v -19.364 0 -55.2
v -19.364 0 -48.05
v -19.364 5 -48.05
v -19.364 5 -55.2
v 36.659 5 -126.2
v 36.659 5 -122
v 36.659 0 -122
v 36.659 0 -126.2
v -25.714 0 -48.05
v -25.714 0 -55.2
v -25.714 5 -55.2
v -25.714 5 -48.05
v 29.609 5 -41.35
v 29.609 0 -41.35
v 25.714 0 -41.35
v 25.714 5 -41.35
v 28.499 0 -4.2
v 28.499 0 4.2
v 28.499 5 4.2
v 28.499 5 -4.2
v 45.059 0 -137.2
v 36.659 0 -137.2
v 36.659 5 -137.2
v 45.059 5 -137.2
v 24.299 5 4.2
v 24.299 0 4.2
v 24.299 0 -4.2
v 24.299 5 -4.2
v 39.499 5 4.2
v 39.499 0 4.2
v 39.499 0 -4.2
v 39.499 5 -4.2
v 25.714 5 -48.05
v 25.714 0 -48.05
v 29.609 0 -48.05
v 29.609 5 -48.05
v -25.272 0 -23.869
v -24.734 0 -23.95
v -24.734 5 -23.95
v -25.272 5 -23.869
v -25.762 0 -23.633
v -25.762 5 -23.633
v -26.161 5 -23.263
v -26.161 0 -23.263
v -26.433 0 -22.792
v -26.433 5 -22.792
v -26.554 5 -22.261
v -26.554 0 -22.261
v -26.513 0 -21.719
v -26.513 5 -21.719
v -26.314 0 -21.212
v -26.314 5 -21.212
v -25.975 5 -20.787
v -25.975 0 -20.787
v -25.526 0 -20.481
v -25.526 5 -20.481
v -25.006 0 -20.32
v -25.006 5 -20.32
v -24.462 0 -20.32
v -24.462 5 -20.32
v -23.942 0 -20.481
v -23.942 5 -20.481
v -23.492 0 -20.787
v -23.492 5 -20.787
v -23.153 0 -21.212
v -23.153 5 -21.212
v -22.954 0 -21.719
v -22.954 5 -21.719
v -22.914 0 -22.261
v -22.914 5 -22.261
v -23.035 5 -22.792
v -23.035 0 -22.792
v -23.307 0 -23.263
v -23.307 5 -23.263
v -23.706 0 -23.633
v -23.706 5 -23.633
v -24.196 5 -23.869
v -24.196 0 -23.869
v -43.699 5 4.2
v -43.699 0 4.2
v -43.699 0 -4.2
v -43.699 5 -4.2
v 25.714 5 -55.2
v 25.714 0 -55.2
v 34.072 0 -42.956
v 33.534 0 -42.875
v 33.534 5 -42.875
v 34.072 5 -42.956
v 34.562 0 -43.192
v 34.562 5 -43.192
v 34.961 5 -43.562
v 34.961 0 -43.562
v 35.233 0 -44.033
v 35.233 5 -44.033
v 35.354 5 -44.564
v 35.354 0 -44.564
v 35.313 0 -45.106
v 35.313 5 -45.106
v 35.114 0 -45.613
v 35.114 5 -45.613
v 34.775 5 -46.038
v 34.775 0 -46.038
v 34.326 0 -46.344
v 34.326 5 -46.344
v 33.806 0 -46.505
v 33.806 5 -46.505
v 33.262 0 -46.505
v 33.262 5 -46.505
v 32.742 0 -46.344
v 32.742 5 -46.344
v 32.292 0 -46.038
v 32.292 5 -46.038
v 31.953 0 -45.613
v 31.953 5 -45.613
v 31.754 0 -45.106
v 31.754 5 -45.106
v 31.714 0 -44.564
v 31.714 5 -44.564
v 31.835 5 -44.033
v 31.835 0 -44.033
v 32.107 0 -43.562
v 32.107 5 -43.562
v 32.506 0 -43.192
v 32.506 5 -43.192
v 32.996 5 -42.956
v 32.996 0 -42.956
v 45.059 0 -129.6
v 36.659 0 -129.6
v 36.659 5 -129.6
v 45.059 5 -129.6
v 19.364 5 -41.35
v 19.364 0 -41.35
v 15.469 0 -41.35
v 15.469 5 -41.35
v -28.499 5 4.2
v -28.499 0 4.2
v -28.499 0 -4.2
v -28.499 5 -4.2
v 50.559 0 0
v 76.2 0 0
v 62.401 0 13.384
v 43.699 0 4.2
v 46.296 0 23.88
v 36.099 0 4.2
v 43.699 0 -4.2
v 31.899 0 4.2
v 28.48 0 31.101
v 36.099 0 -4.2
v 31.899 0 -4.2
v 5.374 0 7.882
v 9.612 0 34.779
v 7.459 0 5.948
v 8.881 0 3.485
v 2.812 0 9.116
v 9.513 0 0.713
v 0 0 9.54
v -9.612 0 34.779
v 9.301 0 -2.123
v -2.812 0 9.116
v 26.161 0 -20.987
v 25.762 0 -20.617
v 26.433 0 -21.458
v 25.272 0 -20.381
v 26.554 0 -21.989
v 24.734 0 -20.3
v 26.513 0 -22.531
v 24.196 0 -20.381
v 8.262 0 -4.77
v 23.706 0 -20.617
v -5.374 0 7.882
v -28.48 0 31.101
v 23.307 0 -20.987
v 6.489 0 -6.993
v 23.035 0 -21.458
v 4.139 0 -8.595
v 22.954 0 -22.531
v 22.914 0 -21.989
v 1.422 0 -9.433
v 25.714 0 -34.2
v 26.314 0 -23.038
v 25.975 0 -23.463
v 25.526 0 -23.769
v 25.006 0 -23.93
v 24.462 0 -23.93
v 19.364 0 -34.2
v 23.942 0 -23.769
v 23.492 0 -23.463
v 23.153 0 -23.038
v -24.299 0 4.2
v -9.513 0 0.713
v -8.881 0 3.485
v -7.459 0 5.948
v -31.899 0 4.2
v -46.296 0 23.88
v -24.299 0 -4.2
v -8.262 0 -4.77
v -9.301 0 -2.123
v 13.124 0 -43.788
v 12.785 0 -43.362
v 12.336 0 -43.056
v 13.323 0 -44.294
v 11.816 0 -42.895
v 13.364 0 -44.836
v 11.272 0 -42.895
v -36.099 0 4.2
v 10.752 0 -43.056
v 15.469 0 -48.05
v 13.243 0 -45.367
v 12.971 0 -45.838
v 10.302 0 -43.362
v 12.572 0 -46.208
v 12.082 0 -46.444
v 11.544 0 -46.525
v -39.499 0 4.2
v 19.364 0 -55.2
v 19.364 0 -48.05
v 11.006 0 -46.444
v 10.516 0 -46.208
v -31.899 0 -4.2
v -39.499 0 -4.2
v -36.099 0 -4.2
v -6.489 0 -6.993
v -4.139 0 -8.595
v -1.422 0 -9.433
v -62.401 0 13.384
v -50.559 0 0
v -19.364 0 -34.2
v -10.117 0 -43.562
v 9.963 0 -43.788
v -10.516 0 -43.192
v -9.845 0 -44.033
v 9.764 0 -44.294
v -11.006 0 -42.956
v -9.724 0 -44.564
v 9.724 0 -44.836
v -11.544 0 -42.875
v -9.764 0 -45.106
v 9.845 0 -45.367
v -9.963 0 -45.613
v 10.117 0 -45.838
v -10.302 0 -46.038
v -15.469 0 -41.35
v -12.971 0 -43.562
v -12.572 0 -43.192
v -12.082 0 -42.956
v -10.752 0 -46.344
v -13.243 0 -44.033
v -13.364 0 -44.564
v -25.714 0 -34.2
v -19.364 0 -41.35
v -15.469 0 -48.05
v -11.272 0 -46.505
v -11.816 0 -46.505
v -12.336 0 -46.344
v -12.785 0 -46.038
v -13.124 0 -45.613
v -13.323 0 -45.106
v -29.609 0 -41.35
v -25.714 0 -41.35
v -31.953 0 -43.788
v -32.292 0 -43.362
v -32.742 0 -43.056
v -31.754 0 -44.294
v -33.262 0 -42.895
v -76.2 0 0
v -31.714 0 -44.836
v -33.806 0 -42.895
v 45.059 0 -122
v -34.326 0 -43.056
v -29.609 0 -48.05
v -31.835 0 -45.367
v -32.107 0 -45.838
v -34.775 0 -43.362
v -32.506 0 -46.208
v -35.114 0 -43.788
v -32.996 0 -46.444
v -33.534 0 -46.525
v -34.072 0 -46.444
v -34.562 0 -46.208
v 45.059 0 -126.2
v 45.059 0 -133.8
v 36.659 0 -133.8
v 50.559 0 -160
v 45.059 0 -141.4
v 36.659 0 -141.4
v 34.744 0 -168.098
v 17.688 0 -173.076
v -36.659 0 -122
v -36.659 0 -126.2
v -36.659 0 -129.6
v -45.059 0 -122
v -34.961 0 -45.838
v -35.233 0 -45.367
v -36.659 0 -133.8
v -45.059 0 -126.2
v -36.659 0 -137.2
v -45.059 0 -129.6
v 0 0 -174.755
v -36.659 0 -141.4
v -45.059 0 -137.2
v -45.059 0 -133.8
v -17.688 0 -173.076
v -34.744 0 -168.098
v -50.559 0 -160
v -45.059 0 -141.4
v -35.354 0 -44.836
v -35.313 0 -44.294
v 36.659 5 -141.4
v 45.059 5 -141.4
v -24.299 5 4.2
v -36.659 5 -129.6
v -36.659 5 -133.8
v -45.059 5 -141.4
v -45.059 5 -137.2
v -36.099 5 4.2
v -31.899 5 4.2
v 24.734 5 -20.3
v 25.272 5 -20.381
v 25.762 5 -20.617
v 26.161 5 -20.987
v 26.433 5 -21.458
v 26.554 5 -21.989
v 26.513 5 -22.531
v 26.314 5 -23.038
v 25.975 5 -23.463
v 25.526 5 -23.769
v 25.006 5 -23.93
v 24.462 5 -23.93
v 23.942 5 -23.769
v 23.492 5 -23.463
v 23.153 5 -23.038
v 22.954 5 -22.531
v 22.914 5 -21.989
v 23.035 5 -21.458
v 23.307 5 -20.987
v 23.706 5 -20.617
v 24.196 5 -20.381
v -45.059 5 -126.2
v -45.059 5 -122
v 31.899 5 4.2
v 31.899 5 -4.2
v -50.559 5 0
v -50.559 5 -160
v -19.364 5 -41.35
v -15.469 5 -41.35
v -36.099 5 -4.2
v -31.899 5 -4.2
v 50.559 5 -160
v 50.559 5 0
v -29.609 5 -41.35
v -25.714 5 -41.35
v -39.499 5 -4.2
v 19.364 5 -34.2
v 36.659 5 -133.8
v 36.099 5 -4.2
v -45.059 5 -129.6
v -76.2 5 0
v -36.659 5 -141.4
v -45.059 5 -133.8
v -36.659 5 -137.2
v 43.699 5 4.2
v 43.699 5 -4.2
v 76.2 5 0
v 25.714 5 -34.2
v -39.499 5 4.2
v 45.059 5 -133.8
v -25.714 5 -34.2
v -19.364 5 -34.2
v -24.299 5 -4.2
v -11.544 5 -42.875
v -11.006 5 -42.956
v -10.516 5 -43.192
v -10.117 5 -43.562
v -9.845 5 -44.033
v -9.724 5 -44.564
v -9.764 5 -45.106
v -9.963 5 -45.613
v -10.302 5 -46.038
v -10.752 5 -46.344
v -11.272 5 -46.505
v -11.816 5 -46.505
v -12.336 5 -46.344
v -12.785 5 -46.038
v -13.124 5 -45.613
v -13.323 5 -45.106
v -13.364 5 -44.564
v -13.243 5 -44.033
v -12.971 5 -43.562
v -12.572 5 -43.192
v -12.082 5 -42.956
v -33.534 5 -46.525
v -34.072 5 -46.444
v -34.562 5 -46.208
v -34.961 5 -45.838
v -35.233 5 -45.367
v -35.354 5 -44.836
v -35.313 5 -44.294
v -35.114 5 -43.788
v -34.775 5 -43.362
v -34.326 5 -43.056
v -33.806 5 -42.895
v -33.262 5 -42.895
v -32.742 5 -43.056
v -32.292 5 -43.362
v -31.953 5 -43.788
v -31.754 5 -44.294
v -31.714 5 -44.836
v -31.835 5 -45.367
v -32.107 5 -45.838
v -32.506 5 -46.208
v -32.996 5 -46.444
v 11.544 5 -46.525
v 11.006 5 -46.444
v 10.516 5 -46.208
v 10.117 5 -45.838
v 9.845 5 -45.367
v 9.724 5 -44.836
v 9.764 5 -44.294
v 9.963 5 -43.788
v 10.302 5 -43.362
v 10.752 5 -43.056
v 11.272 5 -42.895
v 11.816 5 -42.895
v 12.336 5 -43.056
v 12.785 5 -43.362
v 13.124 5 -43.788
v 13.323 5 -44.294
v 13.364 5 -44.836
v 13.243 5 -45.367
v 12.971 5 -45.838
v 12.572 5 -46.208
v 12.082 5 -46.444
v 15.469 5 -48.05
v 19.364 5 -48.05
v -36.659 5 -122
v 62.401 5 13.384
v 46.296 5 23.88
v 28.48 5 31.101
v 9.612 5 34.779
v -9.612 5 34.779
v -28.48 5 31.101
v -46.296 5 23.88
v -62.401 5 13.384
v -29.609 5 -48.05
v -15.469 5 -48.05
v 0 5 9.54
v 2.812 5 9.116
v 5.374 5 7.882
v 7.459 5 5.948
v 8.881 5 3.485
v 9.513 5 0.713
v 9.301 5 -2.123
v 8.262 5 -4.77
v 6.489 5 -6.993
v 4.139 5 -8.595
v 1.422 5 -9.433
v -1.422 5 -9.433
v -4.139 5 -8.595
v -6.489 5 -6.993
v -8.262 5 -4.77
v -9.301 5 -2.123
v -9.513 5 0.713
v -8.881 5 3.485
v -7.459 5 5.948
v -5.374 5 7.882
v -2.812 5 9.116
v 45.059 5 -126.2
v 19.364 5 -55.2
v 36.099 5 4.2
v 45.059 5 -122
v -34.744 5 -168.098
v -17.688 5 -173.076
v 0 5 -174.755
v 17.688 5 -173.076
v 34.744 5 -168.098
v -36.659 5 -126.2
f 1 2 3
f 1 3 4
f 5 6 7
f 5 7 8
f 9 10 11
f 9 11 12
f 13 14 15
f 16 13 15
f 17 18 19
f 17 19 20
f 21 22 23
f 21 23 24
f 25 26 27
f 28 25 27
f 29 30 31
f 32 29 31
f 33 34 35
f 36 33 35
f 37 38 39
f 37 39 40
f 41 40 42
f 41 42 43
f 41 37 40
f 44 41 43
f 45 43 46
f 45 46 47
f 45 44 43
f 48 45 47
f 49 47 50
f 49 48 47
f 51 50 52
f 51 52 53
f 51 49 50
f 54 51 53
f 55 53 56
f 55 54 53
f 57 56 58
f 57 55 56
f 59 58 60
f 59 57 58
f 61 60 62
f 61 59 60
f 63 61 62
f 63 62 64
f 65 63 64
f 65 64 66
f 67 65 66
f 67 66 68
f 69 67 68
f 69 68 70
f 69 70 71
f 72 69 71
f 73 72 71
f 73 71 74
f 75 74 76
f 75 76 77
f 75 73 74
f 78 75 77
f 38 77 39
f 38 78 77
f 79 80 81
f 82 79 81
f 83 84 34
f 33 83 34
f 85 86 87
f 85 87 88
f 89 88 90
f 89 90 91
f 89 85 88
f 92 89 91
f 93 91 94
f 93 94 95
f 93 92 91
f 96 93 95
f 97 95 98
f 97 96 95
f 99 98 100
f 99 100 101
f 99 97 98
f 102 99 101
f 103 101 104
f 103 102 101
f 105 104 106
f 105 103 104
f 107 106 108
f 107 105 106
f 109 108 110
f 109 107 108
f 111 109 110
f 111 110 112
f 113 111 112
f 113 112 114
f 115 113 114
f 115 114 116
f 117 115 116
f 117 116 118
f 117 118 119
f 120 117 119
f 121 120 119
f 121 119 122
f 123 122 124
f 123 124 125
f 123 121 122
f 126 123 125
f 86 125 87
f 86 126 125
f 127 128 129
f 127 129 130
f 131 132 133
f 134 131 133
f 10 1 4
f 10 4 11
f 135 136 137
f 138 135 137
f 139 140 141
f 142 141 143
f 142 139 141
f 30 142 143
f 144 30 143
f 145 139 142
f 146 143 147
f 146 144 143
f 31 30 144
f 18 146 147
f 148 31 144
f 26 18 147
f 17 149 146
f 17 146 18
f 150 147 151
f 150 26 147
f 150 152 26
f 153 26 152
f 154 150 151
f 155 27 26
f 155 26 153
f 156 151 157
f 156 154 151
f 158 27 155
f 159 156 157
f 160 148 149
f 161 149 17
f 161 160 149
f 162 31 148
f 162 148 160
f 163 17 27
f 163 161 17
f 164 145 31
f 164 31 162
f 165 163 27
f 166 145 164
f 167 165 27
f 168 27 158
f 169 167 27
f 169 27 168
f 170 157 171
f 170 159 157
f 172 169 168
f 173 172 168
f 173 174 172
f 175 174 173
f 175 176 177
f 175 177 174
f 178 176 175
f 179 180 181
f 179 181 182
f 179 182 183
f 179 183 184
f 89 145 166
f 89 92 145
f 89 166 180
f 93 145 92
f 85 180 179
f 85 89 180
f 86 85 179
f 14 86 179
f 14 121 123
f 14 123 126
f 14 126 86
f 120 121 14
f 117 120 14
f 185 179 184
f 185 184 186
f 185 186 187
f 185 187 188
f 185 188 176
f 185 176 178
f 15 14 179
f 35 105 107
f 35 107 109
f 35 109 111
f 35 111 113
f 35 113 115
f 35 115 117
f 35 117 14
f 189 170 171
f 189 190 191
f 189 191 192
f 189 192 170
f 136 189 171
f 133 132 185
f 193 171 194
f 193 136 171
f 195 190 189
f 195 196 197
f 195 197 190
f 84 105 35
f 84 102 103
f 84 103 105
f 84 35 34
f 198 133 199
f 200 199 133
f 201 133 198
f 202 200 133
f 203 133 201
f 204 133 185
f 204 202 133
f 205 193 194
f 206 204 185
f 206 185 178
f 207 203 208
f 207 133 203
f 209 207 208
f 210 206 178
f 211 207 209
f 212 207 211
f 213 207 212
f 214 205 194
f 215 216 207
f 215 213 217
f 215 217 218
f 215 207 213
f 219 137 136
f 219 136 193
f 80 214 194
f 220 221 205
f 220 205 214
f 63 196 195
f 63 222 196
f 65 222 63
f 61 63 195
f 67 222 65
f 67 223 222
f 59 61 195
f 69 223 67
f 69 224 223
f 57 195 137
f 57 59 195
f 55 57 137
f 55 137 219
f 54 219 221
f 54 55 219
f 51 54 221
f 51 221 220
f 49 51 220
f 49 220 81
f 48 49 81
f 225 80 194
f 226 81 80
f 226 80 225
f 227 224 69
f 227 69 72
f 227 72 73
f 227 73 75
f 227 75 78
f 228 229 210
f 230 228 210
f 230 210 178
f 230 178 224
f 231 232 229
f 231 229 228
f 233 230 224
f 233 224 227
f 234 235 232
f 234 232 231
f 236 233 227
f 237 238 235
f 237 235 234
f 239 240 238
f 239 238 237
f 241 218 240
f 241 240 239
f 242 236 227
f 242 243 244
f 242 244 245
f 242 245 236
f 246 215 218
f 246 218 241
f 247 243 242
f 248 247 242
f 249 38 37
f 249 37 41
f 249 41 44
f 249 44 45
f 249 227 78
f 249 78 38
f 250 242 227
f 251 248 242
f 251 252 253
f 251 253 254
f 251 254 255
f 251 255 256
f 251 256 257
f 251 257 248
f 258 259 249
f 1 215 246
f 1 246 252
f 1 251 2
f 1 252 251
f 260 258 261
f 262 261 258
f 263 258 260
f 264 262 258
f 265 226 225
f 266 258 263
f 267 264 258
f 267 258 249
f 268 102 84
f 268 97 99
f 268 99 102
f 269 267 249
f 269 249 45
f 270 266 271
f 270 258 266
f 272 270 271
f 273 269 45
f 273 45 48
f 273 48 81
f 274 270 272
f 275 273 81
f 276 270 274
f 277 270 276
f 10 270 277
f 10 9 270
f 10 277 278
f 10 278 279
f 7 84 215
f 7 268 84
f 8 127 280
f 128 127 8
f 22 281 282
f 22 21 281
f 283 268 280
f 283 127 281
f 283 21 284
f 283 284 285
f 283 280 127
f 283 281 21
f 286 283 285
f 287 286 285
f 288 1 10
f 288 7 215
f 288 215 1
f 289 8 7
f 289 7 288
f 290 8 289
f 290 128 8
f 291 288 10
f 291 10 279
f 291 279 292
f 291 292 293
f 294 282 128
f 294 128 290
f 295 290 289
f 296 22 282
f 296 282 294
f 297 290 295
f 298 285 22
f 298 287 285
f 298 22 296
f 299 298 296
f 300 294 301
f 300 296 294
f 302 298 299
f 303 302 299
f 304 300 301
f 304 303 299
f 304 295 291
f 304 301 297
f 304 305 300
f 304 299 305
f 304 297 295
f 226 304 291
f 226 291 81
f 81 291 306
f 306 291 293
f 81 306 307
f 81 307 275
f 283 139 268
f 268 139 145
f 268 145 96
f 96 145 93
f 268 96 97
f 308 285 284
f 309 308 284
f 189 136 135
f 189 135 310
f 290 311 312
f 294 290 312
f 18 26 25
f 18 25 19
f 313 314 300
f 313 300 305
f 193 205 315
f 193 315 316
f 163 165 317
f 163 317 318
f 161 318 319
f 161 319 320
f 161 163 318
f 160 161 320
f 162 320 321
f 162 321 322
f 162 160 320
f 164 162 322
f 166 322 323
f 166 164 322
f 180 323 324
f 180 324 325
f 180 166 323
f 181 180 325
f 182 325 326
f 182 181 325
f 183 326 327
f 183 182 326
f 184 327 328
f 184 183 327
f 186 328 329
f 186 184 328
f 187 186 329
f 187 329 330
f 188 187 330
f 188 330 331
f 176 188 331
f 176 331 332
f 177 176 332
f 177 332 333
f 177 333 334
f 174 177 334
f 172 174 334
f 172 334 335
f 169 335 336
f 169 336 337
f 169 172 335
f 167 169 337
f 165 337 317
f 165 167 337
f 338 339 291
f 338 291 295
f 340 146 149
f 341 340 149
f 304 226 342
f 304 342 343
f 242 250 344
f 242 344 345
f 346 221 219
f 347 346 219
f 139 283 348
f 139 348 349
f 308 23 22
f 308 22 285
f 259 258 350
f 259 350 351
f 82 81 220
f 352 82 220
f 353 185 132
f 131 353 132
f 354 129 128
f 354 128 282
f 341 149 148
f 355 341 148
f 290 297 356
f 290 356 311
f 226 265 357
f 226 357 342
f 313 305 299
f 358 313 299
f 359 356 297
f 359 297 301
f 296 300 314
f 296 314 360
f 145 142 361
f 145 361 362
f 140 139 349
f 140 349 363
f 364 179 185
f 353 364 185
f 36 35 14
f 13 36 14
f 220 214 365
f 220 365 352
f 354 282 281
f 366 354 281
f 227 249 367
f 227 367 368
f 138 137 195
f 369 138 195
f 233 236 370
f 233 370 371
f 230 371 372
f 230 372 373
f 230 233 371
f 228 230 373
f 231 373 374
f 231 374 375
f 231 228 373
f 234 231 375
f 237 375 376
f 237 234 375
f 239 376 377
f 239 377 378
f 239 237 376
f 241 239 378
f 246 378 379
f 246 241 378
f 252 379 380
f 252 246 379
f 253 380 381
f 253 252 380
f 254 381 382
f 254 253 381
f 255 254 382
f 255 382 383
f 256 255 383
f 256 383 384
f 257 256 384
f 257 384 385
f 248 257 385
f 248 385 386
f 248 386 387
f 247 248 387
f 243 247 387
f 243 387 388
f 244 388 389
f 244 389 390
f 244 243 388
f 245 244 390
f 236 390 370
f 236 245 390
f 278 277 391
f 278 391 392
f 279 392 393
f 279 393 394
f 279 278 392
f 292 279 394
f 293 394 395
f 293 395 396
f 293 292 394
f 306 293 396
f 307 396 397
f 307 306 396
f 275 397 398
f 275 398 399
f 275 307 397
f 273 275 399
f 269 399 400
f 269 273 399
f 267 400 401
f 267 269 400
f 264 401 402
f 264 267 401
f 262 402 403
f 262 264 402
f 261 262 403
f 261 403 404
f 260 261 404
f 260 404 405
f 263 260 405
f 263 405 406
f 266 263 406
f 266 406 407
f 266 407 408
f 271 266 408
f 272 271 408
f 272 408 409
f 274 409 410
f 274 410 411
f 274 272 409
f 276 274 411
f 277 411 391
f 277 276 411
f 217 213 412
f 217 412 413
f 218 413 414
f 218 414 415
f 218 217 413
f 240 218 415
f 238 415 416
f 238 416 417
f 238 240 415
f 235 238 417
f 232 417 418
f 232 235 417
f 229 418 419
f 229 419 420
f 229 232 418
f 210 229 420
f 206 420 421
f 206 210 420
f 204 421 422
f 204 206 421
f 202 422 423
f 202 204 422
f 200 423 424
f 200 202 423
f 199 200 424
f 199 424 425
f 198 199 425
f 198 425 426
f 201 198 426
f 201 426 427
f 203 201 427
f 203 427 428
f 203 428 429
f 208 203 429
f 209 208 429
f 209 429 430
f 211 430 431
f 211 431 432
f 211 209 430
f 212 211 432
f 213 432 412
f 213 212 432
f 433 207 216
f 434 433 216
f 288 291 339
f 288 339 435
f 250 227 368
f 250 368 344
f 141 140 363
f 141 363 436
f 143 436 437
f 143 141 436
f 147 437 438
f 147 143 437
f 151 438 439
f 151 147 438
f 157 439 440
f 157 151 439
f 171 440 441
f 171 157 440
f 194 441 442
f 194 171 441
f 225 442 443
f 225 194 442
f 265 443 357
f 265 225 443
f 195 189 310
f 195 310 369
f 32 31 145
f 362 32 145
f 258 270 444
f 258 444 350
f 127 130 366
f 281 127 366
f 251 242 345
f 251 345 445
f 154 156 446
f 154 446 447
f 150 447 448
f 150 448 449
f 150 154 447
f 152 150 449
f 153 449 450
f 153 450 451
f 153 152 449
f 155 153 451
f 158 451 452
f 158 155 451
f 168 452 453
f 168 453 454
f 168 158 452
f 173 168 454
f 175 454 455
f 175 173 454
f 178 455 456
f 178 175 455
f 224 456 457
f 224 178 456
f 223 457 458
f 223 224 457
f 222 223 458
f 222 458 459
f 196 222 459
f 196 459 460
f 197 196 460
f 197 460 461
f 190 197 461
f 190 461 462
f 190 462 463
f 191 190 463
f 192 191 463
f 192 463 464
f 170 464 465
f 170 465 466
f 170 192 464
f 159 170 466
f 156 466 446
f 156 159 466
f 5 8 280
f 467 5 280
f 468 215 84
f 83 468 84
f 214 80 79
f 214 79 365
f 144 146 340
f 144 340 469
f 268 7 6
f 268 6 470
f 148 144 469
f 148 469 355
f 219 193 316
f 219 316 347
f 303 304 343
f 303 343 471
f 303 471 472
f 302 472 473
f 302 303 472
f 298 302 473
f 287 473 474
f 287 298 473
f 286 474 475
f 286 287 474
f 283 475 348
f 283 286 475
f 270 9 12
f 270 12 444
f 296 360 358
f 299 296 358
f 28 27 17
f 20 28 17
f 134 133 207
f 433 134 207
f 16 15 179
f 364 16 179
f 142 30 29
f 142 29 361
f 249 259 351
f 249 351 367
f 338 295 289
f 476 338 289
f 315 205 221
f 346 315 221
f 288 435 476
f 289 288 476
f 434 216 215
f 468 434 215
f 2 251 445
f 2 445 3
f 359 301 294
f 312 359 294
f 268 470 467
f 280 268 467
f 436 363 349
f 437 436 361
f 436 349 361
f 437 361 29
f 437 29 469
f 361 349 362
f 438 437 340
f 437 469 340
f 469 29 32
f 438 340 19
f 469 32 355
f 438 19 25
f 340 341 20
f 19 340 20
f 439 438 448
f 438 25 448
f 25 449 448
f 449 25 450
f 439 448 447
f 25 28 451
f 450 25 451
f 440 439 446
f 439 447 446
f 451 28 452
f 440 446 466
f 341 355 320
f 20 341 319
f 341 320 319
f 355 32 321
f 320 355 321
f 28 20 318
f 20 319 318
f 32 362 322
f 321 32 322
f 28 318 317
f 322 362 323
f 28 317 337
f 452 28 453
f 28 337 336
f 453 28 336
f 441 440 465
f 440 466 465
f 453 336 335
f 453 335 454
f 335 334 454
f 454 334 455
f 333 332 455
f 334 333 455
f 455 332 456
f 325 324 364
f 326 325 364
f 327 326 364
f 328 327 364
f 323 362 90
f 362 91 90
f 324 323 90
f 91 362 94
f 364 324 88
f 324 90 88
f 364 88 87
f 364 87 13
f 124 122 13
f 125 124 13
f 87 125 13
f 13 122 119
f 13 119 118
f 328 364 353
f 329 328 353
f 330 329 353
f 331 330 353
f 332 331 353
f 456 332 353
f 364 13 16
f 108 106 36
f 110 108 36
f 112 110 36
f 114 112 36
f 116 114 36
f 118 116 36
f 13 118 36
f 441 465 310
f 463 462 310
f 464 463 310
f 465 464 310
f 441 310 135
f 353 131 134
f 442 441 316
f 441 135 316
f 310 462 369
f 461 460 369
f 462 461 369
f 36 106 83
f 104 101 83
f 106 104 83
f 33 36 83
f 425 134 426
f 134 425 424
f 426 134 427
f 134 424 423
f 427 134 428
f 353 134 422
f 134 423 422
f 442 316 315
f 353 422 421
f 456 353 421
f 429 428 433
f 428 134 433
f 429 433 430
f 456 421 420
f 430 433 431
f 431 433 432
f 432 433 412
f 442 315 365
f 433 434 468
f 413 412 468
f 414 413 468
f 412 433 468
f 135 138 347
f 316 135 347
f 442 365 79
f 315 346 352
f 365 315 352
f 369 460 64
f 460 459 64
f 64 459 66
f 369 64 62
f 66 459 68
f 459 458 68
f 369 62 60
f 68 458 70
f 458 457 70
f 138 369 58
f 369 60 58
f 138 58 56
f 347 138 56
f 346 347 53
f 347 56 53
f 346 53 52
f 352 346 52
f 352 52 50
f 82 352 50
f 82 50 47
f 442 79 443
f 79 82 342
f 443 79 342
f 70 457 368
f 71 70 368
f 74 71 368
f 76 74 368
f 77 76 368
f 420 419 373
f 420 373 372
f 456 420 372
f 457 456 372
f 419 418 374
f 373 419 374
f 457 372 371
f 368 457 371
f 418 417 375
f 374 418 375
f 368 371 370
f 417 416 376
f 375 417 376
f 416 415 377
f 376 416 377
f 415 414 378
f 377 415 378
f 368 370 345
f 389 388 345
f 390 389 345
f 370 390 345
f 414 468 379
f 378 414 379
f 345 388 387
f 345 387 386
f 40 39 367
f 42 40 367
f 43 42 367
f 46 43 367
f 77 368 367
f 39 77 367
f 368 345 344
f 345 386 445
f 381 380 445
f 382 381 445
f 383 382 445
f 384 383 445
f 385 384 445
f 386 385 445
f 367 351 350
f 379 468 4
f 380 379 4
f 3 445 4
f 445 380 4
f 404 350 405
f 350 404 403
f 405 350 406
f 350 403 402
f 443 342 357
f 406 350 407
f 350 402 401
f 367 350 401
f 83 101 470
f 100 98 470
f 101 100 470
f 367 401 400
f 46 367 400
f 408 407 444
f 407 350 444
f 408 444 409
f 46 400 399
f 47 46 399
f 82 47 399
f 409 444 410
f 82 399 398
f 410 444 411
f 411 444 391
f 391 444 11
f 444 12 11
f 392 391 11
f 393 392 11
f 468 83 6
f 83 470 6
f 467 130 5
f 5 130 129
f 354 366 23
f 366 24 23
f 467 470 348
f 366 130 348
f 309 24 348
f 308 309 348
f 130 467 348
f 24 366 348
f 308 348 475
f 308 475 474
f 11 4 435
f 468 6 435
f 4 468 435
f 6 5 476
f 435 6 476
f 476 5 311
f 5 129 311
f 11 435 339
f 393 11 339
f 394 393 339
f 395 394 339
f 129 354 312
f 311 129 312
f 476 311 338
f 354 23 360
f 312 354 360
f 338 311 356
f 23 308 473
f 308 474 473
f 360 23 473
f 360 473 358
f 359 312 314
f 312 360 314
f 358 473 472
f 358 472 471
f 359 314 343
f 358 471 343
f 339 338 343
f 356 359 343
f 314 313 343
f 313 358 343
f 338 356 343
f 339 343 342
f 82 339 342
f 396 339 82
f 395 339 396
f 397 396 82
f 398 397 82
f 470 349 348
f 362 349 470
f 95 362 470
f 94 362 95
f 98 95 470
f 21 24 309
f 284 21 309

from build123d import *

# Parameters (mm, degrees)
CROQUIS3_R              = 9.54
CROQUIS3_R_2            = 1.825
CROQUIS3_W              = 8.4
CROQUIS3_H              = 4.2
CROQUIS3_W_2            = 4.2
CROQUIS3_H_2            = 8.4
SALIENTE_EXTRUIR1_DEPTH = 5


with BuildPart() as part:
    # Croquis3 → Saliente-Extruir1 (new body)
    with BuildSketch(Plane(origin=(0, 0, 0), x_dir=(1, 0, 0), z_dir=(0, 1, 0))):
        with BuildLine():
            Line((50.5587, 0), (76.2, 0))
            ThreePointArc((76.2, 0), (0, -35.242297755), (-76.2, 0))
            Line((-76.2, 0), (-50.5587, 0))
            Line((-50.5587, 0), (-50.5587, 160))
            ThreePointArc((-50.5587, 160), (0, 174.754698219), (50.5587, 160))
            Line((50.5587, 160), (50.5587, 0))
        make_face()
        with Locations(Location((0, 0, 0), (0, 0, 270))):
            Circle(CROQUIS3_R, mode=Mode.SUBTRACT)
        with Locations(Location((33.5337, 44.7, 0), (0, 0, 270))):
            Circle(CROQUIS3_R_2, mode=Mode.SUBTRACT)
        with Locations(Location((11.5437, 44.7, 0), (0, 0, 90))):
            Circle(CROQUIS3_R_2, mode=Mode.SUBTRACT)
        with Locations(Location((-33.5337, 44.7, 0), (0, 0, 90))):
            Circle(CROQUIS3_R_2, mode=Mode.SUBTRACT)
        with Locations(Location((-11.5437, 44.7, 0), (0, 0, 270))):
            Circle(CROQUIS3_R_2, mode=Mode.SUBTRACT)
        with Locations(Location((24.7337, 22.125, 0), (0, 0, 270))):
            Circle(CROQUIS3_R_2, mode=Mode.SUBTRACT)
        with Locations(Location((-24.7337, 22.125, 0), (0, 0, 90))):
            Circle(CROQUIS3_R_2, mode=Mode.SUBTRACT)
        with Locations((40.8587, 131.7)):
            Rectangle(CROQUIS3_W, CROQUIS3_H, mode=Mode.SUBTRACT)
        with Locations((40.8587, 124.1)):
            Rectangle(CROQUIS3_W, CROQUIS3_H, mode=Mode.SUBTRACT)
        with Locations((40.8587, 139.3)):
            Rectangle(CROQUIS3_W, CROQUIS3_H, mode=Mode.SUBTRACT)
        with Locations((-40.8587, 124.1)):
            Rectangle(CROQUIS3_W, CROQUIS3_H, mode=Mode.SUBTRACT)
        with Locations((-40.8587, 131.7)):
            Rectangle(CROQUIS3_W, CROQUIS3_H, mode=Mode.SUBTRACT)
        with Locations((-40.8587, 139.3)):
            Rectangle(CROQUIS3_W, CROQUIS3_H, mode=Mode.SUBTRACT)
        with Locations((33.9987, 0)):
            Rectangle(CROQUIS3_W_2, CROQUIS3_H_2, mode=Mode.SUBTRACT)
        with Locations((41.5987, 0)):
            Rectangle(CROQUIS3_W_2, CROQUIS3_H_2, mode=Mode.SUBTRACT)
        with Locations((26.3987, 0)):
            Rectangle(CROQUIS3_W_2, CROQUIS3_H_2, mode=Mode.SUBTRACT)
        with Locations((-41.5987, 0)):
            Rectangle(CROQUIS3_W_2, CROQUIS3_H_2, mode=Mode.SUBTRACT)
        with Locations((-33.9987, 0)):
            Rectangle(CROQUIS3_W_2, CROQUIS3_H_2, mode=Mode.SUBTRACT)
        with Locations((-26.3987, 0)):
            Rectangle(CROQUIS3_W_2, CROQUIS3_H_2, mode=Mode.SUBTRACT)
        Polygon((19.3637, 34.2), (19.3637, 41.35), (15.4687, 41.35), (15.4687, 48.05), (19.3637, 48.05), (19.3637, 55.2), (25.7137, 55.2), (25.7137, 48.05), (29.6087, 48.05), (29.6087, 41.35), (25.7137, 41.35), (25.7137, 34.2), align=None, mode=Mode.SUBTRACT)
        Polygon((-19.3637, 34.2), (-19.3637, 41.35), (-15.4687, 41.35), (-15.4687, 48.05), (-19.3637, 48.05), (-19.3637, 55.2), (-25.7137, 55.2), (-25.7137, 48.05), (-29.6087, 48.05), (-29.6087, 41.35), (-25.7137, 41.35), (-25.7137, 34.2), align=None, mode=Mode.SUBTRACT)
    extrude(amount=SALIENTE_EXTRUIR1_DEPTH)


solid = part.part
